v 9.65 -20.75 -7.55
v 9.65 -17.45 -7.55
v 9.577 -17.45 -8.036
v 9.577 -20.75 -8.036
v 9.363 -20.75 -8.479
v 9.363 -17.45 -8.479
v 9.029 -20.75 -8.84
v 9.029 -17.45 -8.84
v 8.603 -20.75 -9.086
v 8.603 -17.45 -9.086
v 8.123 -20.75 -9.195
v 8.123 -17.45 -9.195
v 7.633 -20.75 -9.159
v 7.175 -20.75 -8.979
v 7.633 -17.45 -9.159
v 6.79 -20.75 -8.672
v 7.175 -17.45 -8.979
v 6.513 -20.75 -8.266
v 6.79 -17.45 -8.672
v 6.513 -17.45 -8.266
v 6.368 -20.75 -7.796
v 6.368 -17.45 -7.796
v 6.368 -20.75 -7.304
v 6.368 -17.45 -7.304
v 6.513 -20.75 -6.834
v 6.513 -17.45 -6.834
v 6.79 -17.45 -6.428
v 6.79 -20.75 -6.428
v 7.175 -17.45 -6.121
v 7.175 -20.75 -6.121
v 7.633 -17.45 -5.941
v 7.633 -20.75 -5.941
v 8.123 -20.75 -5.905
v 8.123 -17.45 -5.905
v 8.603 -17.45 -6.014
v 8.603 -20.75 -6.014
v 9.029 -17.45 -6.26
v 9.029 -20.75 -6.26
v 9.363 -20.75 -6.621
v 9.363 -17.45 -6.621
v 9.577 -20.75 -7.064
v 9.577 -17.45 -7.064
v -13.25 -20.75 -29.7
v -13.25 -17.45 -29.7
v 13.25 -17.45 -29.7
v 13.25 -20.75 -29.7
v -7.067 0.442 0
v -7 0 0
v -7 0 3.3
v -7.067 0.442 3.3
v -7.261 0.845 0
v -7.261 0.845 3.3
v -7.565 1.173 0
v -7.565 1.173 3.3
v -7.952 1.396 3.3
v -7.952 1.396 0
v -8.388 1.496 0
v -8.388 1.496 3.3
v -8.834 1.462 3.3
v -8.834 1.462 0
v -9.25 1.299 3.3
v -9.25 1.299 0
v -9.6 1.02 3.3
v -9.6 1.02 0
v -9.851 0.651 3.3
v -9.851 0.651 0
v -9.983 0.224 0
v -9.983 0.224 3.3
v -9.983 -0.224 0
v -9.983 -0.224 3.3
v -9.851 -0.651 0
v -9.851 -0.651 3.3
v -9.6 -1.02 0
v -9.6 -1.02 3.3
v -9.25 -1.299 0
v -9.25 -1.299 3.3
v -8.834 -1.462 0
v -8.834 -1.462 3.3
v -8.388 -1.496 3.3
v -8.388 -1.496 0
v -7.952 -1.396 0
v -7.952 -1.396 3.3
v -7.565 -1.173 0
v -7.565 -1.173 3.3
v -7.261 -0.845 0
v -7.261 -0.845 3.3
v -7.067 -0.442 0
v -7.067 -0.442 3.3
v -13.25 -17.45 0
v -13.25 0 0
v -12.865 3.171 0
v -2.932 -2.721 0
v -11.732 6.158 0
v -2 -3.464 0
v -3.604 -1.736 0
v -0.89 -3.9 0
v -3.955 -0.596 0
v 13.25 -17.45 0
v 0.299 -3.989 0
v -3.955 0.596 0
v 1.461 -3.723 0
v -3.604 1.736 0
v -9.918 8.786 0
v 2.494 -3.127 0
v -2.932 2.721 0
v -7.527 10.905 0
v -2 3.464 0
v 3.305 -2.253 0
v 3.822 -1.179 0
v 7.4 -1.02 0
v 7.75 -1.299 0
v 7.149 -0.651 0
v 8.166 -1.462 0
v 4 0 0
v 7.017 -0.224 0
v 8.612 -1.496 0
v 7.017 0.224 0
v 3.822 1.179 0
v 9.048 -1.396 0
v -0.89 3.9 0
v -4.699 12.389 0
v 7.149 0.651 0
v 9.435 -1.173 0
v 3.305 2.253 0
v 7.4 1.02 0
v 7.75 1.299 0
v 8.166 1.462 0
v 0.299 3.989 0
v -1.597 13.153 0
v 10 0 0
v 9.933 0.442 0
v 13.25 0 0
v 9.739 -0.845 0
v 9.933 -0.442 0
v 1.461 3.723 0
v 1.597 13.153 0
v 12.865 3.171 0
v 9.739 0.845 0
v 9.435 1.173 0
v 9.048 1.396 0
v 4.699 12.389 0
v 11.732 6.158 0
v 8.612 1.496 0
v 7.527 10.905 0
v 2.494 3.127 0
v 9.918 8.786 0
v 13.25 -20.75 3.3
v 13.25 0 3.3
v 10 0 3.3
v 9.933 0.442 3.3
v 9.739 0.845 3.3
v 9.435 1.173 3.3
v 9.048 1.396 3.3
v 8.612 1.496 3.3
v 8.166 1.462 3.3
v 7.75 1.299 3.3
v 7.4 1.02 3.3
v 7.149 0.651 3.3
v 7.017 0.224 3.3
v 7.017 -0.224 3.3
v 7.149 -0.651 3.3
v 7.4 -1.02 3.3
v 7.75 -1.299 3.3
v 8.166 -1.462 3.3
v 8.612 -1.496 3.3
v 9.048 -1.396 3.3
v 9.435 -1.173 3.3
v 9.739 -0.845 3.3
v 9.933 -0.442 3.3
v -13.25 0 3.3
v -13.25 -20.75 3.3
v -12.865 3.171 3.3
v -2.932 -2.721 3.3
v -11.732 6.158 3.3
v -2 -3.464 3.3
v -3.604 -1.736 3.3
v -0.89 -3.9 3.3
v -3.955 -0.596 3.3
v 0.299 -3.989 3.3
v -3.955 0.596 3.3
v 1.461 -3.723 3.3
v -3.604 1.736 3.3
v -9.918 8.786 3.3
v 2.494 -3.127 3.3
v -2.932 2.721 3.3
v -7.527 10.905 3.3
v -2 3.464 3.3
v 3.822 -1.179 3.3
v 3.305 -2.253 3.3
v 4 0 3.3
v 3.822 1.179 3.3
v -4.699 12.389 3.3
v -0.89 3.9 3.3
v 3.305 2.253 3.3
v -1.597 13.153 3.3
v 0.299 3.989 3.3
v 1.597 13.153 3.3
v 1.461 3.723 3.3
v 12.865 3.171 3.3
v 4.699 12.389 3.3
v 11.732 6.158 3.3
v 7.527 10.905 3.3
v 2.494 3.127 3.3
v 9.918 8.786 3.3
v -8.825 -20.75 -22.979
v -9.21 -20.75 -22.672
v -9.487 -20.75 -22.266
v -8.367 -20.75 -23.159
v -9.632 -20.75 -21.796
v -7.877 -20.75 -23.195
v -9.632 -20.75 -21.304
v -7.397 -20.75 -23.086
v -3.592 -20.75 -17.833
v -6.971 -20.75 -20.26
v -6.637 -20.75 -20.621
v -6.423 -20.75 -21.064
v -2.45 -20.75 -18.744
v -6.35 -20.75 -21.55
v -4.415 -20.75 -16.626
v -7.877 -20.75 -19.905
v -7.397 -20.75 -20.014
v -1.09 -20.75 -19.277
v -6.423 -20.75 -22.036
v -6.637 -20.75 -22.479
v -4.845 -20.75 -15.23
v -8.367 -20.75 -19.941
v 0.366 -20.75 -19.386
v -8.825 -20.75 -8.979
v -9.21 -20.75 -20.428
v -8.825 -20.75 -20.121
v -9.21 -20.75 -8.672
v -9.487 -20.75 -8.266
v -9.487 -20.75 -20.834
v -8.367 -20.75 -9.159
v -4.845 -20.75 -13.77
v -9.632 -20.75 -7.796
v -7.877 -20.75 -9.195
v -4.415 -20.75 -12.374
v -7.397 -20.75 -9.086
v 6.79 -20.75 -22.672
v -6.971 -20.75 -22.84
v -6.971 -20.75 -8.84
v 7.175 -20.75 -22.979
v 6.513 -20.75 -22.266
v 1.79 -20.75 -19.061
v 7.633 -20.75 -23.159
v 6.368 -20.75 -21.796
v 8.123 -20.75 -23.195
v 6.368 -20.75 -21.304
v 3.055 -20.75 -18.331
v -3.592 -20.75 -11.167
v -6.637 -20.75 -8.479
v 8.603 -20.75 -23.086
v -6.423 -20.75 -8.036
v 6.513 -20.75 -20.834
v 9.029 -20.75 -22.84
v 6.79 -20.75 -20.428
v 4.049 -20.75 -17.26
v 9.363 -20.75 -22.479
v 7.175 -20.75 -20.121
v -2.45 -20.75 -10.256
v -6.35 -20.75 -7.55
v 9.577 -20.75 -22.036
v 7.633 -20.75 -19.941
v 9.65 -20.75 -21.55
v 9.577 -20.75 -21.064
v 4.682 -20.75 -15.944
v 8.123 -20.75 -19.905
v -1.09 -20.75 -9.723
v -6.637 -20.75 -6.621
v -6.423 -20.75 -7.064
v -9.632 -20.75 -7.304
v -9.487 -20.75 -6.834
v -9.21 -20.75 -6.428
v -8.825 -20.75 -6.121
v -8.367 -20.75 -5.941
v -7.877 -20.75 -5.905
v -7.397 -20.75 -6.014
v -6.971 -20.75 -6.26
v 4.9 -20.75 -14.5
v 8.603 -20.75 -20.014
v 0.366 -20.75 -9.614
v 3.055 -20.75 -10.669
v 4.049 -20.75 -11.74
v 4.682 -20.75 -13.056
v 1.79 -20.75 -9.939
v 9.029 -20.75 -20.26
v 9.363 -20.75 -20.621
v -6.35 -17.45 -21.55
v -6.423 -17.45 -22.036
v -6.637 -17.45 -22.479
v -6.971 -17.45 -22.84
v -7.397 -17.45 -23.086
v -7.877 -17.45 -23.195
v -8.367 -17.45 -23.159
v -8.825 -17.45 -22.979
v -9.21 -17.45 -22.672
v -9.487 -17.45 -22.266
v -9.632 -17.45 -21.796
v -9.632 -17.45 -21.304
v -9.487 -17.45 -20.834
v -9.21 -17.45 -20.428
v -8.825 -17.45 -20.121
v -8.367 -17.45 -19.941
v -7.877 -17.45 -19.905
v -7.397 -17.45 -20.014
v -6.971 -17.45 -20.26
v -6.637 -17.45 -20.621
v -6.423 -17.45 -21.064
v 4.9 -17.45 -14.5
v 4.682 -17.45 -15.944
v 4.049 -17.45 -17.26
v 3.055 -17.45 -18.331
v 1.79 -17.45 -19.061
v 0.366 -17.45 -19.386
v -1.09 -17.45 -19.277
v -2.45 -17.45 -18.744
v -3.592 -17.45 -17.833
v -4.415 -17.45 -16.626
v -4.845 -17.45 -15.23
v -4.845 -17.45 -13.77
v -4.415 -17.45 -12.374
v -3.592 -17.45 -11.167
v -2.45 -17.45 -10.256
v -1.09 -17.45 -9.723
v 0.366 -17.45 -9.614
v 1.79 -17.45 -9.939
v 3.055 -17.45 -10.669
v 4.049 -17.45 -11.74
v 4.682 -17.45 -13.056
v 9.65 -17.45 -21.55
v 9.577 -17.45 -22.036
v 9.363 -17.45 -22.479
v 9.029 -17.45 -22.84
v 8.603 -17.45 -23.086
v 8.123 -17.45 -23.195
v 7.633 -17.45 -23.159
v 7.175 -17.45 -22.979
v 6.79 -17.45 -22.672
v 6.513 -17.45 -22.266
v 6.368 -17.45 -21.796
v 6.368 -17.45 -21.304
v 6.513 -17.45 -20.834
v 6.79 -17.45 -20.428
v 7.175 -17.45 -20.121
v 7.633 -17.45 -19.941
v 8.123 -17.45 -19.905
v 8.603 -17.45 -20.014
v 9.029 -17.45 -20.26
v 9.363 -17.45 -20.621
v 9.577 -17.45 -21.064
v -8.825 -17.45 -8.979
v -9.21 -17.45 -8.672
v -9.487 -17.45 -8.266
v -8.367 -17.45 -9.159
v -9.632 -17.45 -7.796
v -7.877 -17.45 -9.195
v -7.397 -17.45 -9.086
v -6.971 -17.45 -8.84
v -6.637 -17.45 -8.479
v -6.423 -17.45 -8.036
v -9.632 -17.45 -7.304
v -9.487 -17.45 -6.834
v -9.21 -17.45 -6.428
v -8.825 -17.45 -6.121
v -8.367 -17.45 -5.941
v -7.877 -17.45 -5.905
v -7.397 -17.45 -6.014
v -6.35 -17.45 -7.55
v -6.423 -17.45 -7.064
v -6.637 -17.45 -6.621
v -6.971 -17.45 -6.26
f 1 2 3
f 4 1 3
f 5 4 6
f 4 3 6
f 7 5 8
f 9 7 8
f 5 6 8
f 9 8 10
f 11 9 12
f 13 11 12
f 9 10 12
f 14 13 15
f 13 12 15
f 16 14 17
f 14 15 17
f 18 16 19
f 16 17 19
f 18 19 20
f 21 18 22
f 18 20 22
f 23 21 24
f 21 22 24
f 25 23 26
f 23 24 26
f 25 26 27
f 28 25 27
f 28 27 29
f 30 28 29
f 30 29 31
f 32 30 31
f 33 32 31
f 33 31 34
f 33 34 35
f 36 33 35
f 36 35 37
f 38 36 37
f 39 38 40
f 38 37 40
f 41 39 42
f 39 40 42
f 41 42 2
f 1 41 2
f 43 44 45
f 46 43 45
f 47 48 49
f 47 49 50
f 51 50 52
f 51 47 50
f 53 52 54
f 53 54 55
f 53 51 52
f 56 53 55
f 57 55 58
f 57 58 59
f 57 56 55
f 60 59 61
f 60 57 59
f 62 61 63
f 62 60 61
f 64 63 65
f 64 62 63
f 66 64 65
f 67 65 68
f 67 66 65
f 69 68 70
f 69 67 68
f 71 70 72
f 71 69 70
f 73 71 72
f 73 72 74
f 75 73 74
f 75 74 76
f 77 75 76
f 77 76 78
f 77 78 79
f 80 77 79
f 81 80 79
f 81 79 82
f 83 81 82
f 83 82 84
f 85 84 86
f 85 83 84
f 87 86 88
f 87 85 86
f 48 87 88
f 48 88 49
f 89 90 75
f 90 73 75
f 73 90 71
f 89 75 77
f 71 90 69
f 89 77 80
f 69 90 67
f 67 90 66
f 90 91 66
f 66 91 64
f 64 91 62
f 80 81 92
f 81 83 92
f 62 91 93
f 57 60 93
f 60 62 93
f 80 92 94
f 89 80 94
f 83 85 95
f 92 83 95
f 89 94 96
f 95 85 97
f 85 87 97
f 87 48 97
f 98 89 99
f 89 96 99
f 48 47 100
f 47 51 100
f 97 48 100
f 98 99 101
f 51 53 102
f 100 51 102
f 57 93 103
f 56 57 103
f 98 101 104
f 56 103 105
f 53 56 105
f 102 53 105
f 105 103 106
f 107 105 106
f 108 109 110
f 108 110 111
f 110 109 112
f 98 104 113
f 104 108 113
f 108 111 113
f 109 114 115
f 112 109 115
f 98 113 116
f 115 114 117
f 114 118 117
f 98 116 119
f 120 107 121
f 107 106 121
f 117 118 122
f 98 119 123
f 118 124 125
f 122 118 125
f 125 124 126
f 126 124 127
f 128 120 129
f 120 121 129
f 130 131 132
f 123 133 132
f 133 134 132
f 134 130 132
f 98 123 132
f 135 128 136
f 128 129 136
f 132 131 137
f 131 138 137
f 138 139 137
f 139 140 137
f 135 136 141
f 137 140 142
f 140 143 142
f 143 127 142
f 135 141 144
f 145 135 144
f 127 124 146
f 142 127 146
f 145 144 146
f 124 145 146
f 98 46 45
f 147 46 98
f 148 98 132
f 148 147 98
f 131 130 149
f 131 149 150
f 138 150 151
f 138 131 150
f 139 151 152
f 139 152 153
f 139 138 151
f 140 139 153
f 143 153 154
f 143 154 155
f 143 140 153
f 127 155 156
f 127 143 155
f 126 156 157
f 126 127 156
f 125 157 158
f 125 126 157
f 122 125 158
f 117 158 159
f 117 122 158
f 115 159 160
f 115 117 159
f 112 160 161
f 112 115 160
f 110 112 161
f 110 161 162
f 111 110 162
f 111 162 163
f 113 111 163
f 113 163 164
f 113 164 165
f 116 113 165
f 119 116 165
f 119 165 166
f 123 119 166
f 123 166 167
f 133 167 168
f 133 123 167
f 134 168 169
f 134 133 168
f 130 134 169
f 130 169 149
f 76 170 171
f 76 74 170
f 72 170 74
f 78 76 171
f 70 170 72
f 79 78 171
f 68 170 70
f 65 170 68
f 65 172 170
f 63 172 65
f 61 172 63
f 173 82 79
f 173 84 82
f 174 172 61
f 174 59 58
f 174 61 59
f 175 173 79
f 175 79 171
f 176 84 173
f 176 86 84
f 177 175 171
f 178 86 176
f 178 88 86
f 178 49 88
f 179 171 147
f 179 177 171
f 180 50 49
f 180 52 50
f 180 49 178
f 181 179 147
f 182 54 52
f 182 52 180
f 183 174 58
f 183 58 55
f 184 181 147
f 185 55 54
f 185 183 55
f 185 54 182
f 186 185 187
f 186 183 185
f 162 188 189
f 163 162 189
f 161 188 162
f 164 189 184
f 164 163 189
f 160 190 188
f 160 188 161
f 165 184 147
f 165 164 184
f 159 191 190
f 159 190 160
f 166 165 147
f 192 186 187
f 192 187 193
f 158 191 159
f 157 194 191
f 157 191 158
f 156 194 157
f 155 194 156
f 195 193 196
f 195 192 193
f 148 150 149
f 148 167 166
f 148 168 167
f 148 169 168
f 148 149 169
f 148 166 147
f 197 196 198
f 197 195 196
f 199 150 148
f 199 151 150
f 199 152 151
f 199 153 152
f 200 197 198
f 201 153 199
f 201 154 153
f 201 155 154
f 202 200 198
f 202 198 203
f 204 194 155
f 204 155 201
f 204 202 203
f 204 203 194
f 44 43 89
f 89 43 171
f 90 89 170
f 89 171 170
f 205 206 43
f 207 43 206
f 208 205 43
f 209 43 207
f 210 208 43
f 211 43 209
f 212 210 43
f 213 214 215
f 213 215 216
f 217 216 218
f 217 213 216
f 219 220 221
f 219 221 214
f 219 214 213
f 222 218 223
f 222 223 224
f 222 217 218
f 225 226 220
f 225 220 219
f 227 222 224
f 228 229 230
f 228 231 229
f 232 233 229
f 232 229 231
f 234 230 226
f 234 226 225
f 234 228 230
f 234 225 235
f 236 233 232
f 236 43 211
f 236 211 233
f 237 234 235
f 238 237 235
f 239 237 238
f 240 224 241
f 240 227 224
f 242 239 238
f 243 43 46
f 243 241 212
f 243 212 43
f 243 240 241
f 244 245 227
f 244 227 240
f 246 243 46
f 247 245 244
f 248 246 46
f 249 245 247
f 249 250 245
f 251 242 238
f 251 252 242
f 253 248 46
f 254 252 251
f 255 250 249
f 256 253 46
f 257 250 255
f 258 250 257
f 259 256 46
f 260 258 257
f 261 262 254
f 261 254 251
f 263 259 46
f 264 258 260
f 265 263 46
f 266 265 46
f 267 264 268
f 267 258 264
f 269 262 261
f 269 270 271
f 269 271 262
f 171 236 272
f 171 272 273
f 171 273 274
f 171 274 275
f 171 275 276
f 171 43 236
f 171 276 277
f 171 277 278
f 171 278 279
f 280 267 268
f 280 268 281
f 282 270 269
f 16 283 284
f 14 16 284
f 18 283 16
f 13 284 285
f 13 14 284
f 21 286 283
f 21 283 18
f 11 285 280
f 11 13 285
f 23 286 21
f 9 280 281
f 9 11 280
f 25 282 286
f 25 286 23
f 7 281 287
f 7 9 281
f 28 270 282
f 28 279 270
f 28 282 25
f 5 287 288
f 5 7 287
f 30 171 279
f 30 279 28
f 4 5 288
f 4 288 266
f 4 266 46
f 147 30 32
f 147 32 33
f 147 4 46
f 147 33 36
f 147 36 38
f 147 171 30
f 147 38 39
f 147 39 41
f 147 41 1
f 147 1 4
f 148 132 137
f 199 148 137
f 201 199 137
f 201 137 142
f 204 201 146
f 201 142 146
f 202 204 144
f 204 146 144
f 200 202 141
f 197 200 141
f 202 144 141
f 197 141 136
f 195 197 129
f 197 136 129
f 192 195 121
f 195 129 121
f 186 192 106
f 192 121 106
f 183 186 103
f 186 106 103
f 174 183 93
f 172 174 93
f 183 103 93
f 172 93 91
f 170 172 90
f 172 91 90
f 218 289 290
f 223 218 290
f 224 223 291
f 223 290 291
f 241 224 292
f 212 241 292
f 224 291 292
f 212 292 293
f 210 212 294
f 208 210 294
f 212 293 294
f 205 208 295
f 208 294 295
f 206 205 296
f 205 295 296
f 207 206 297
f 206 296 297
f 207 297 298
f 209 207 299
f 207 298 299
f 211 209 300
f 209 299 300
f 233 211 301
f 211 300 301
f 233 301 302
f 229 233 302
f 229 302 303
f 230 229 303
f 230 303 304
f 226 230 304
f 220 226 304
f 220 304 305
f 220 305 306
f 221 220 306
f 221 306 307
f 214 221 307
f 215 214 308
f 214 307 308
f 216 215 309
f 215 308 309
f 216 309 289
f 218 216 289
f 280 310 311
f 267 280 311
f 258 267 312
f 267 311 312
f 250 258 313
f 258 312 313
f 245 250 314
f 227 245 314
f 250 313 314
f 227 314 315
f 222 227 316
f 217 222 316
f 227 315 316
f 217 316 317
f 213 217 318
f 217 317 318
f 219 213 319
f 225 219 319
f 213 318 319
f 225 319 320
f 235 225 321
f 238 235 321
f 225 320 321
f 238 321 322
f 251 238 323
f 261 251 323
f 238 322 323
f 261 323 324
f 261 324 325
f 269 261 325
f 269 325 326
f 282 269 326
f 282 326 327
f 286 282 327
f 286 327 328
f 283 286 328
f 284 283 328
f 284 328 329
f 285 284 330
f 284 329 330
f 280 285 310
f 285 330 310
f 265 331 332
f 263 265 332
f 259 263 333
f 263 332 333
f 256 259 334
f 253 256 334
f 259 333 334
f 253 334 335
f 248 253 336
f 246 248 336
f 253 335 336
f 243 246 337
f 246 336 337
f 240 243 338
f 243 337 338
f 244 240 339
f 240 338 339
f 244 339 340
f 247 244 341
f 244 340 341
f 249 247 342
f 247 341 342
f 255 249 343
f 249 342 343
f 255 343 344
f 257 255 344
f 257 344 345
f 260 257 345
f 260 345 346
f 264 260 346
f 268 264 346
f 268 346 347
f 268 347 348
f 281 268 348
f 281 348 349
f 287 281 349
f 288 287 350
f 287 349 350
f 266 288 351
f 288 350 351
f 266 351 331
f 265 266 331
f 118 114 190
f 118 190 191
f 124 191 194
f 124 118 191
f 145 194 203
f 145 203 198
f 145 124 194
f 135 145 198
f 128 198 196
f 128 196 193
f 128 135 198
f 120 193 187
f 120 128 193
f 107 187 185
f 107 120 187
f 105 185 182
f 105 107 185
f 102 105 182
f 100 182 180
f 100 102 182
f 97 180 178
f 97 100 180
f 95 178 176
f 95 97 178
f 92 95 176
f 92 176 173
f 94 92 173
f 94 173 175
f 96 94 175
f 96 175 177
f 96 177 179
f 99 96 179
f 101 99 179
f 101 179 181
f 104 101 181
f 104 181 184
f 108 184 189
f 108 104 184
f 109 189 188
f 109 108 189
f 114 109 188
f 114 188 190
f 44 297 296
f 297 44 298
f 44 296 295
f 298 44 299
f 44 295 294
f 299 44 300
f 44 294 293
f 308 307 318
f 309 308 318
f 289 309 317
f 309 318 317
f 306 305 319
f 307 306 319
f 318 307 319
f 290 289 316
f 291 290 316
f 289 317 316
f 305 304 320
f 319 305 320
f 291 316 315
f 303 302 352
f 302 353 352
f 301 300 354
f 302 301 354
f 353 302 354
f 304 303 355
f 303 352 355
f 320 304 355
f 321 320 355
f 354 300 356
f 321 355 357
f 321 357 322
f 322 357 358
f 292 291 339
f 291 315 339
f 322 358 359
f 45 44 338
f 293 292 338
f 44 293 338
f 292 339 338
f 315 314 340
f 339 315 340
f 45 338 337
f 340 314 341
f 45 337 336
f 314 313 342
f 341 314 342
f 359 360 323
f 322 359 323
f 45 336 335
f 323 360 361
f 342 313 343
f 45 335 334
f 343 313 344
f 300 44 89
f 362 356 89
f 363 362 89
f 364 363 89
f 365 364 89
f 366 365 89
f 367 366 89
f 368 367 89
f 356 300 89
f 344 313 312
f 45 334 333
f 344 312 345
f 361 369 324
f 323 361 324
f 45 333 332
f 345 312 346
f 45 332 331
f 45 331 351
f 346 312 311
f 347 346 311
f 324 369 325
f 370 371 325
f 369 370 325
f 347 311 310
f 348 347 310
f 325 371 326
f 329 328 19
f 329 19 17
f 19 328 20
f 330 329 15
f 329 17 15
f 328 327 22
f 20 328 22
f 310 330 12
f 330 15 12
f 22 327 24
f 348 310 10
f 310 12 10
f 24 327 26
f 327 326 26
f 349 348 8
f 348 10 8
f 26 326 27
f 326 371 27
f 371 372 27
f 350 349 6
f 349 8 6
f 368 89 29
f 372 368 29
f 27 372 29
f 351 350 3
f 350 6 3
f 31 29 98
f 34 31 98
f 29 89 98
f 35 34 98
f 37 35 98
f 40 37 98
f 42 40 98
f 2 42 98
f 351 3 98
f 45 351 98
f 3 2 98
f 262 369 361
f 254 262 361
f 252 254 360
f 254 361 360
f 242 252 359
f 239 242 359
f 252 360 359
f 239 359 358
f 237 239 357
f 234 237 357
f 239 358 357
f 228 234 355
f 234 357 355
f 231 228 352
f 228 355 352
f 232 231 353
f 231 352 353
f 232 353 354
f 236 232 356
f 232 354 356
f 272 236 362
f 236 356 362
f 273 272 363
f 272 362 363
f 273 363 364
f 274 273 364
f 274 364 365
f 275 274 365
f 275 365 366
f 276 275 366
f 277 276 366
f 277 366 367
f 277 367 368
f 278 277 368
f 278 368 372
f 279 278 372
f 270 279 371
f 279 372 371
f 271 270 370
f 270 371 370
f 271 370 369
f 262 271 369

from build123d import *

# Parameters (mm, degrees)
SKETCH_1_R          = 4
SKETCH_1_R_2        = 1.5
EXTRUDE_1_DEPTH     = 3.3
SKETCH_2_W          = 26.5
SKETCH_2_H          = 3.3
EXTRUDE_2_DEPTH     = 29.7
SKETCH_3_R          = 4.9
SKETCH_3_R_2        = 1.65
CUT_EXTRUDE_1_DEPTH = 3.3


with BuildPart() as part:
    # 草图1 → 凸台-拉伸1 (new body)
    with BuildSketch(Plane.XY):
        with BuildLine():
            Line((-13.25, 0), (-13.25, -20.75))
            Line((-13.25, -20.75), (13.25, -20.75))
            Line((13.25, -20.75), (13.25, 0))
            ThreePointArc((13.25, 0), (0, 13.25), (-13.25, 0))
        make_face()
        Circle(SKETCH_1_R, mode=Mode.SUBTRACT)
        with Locations((-8.5, 0)):
            Circle(SKETCH_1_R_2, mode=Mode.SUBTRACT)
        with Locations((8.5, 0)):
            Circle(SKETCH_1_R_2, mode=Mode.SUBTRACT)
    extrude(amount=EXTRUDE_1_DEPTH)

    # 草图2 → 凸台-拉伸2 (add)
    with BuildSketch(Plane.XY):
        with Locations((0, -19.1)):
            Rectangle(SKETCH_2_W, SKETCH_2_H)
    extrude(amount=-EXTRUDE_2_DEPTH)

    # 草图3 → 切除-拉伸1 (cut)
    with BuildSketch(Plane(origin=(0, -17.45, 0), x_dir=(1, 0, 0), z_dir=(0, 1, 0))):
        with Locations((0, 14.5)):
            Circle(SKETCH_3_R)
        with Locations((-8, 21.55)):
            Circle(SKETCH_3_R_2)
        with Locations((-8, 7.55)):
            Circle(SKETCH_3_R_2)
        with Locations((8, 7.55)):
            Circle(SKETCH_3_R_2)
        with Locations((8, 21.55)):
            Circle(SKETCH_3_R_2)
    extrude(amount=-CUT_EXTRUDE_1_DEPTH, mode=Mode.SUBTRACT)


solid = part.part
